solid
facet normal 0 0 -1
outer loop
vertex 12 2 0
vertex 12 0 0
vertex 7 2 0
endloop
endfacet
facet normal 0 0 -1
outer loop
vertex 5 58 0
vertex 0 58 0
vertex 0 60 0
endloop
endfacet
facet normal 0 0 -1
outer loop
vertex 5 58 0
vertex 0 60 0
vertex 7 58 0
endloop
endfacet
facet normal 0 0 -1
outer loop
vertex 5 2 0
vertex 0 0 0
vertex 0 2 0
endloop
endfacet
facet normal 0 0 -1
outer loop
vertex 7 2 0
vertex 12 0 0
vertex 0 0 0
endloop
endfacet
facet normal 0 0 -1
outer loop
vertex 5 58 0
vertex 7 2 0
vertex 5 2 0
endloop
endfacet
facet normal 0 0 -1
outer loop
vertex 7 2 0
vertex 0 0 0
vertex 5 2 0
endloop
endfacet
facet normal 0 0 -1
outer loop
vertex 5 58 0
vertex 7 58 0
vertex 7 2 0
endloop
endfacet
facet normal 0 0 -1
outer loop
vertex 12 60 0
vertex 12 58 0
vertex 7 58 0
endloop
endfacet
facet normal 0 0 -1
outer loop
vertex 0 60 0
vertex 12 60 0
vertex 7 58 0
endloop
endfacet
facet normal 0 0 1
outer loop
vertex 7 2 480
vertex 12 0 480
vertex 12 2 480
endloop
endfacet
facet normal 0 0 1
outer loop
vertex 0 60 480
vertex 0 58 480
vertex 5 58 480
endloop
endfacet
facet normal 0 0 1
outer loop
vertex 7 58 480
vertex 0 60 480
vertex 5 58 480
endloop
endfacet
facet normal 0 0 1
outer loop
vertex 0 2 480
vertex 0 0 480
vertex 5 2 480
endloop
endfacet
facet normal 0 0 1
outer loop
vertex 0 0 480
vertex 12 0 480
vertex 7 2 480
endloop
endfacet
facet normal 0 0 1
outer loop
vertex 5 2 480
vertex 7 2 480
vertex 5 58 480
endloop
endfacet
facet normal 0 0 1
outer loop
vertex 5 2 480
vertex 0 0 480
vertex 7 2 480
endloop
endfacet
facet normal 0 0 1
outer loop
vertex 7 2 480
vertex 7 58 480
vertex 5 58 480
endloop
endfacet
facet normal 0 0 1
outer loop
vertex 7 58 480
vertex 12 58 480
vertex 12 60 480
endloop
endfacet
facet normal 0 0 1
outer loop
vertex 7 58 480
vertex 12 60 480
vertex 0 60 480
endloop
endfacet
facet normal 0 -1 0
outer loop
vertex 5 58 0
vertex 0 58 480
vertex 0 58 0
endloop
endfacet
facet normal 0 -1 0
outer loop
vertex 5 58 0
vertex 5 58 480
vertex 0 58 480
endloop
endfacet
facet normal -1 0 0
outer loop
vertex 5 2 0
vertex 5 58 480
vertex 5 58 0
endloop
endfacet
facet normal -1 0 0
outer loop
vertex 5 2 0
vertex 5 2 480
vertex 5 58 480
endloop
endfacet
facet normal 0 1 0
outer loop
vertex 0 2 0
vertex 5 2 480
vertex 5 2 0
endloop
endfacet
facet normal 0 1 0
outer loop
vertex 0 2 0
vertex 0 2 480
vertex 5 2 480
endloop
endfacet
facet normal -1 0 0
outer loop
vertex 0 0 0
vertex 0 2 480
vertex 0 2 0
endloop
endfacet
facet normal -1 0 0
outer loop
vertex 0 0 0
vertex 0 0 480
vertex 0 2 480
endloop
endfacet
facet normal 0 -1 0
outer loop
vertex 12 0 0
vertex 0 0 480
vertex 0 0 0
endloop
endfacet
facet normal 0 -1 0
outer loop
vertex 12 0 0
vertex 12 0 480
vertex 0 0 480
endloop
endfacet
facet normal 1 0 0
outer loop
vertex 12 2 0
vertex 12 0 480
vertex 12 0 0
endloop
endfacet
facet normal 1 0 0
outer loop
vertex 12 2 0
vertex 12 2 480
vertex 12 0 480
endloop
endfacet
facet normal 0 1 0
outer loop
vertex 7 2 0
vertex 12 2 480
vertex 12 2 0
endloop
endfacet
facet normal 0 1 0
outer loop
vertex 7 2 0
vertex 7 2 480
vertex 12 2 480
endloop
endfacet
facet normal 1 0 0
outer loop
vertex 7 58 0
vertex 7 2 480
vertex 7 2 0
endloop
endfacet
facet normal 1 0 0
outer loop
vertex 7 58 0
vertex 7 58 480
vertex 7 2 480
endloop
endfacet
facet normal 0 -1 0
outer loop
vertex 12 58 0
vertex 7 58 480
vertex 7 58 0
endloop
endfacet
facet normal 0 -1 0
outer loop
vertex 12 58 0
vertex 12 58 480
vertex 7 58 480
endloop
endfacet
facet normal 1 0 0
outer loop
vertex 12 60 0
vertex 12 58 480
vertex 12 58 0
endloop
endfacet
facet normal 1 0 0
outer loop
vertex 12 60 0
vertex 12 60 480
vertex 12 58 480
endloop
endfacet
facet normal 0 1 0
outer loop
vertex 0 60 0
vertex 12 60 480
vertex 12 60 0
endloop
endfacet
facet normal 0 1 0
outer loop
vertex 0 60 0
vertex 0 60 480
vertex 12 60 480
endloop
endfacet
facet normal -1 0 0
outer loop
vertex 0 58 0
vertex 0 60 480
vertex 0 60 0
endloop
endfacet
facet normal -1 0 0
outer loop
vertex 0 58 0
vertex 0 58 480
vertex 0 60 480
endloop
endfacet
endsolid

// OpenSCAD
/* Test code for an example iBeam */

iBeam(webThickness=2, height=5*12, length=12*40, thickness=2, width=12);

/**
 * @param {Object} params - parameters
 * @param {number} params.webThickness - web thickness
 * @param {number} params.height - beam height
 * @param {number} params.length - beam length
 * @param {number} params.thickness - flange thickness
 * @param {number} params.width - flang width
 */
module iBeam( height, length, thickness, webThickness, width ) {
  linear_extrude(height=length) union() {
    square( [width, thickness] );
    translate([(width - thickness)/2,0]) square( [webThickness, height ]);
    translate([0, height - thickness]) square( [width, thickness] );
  }
}
